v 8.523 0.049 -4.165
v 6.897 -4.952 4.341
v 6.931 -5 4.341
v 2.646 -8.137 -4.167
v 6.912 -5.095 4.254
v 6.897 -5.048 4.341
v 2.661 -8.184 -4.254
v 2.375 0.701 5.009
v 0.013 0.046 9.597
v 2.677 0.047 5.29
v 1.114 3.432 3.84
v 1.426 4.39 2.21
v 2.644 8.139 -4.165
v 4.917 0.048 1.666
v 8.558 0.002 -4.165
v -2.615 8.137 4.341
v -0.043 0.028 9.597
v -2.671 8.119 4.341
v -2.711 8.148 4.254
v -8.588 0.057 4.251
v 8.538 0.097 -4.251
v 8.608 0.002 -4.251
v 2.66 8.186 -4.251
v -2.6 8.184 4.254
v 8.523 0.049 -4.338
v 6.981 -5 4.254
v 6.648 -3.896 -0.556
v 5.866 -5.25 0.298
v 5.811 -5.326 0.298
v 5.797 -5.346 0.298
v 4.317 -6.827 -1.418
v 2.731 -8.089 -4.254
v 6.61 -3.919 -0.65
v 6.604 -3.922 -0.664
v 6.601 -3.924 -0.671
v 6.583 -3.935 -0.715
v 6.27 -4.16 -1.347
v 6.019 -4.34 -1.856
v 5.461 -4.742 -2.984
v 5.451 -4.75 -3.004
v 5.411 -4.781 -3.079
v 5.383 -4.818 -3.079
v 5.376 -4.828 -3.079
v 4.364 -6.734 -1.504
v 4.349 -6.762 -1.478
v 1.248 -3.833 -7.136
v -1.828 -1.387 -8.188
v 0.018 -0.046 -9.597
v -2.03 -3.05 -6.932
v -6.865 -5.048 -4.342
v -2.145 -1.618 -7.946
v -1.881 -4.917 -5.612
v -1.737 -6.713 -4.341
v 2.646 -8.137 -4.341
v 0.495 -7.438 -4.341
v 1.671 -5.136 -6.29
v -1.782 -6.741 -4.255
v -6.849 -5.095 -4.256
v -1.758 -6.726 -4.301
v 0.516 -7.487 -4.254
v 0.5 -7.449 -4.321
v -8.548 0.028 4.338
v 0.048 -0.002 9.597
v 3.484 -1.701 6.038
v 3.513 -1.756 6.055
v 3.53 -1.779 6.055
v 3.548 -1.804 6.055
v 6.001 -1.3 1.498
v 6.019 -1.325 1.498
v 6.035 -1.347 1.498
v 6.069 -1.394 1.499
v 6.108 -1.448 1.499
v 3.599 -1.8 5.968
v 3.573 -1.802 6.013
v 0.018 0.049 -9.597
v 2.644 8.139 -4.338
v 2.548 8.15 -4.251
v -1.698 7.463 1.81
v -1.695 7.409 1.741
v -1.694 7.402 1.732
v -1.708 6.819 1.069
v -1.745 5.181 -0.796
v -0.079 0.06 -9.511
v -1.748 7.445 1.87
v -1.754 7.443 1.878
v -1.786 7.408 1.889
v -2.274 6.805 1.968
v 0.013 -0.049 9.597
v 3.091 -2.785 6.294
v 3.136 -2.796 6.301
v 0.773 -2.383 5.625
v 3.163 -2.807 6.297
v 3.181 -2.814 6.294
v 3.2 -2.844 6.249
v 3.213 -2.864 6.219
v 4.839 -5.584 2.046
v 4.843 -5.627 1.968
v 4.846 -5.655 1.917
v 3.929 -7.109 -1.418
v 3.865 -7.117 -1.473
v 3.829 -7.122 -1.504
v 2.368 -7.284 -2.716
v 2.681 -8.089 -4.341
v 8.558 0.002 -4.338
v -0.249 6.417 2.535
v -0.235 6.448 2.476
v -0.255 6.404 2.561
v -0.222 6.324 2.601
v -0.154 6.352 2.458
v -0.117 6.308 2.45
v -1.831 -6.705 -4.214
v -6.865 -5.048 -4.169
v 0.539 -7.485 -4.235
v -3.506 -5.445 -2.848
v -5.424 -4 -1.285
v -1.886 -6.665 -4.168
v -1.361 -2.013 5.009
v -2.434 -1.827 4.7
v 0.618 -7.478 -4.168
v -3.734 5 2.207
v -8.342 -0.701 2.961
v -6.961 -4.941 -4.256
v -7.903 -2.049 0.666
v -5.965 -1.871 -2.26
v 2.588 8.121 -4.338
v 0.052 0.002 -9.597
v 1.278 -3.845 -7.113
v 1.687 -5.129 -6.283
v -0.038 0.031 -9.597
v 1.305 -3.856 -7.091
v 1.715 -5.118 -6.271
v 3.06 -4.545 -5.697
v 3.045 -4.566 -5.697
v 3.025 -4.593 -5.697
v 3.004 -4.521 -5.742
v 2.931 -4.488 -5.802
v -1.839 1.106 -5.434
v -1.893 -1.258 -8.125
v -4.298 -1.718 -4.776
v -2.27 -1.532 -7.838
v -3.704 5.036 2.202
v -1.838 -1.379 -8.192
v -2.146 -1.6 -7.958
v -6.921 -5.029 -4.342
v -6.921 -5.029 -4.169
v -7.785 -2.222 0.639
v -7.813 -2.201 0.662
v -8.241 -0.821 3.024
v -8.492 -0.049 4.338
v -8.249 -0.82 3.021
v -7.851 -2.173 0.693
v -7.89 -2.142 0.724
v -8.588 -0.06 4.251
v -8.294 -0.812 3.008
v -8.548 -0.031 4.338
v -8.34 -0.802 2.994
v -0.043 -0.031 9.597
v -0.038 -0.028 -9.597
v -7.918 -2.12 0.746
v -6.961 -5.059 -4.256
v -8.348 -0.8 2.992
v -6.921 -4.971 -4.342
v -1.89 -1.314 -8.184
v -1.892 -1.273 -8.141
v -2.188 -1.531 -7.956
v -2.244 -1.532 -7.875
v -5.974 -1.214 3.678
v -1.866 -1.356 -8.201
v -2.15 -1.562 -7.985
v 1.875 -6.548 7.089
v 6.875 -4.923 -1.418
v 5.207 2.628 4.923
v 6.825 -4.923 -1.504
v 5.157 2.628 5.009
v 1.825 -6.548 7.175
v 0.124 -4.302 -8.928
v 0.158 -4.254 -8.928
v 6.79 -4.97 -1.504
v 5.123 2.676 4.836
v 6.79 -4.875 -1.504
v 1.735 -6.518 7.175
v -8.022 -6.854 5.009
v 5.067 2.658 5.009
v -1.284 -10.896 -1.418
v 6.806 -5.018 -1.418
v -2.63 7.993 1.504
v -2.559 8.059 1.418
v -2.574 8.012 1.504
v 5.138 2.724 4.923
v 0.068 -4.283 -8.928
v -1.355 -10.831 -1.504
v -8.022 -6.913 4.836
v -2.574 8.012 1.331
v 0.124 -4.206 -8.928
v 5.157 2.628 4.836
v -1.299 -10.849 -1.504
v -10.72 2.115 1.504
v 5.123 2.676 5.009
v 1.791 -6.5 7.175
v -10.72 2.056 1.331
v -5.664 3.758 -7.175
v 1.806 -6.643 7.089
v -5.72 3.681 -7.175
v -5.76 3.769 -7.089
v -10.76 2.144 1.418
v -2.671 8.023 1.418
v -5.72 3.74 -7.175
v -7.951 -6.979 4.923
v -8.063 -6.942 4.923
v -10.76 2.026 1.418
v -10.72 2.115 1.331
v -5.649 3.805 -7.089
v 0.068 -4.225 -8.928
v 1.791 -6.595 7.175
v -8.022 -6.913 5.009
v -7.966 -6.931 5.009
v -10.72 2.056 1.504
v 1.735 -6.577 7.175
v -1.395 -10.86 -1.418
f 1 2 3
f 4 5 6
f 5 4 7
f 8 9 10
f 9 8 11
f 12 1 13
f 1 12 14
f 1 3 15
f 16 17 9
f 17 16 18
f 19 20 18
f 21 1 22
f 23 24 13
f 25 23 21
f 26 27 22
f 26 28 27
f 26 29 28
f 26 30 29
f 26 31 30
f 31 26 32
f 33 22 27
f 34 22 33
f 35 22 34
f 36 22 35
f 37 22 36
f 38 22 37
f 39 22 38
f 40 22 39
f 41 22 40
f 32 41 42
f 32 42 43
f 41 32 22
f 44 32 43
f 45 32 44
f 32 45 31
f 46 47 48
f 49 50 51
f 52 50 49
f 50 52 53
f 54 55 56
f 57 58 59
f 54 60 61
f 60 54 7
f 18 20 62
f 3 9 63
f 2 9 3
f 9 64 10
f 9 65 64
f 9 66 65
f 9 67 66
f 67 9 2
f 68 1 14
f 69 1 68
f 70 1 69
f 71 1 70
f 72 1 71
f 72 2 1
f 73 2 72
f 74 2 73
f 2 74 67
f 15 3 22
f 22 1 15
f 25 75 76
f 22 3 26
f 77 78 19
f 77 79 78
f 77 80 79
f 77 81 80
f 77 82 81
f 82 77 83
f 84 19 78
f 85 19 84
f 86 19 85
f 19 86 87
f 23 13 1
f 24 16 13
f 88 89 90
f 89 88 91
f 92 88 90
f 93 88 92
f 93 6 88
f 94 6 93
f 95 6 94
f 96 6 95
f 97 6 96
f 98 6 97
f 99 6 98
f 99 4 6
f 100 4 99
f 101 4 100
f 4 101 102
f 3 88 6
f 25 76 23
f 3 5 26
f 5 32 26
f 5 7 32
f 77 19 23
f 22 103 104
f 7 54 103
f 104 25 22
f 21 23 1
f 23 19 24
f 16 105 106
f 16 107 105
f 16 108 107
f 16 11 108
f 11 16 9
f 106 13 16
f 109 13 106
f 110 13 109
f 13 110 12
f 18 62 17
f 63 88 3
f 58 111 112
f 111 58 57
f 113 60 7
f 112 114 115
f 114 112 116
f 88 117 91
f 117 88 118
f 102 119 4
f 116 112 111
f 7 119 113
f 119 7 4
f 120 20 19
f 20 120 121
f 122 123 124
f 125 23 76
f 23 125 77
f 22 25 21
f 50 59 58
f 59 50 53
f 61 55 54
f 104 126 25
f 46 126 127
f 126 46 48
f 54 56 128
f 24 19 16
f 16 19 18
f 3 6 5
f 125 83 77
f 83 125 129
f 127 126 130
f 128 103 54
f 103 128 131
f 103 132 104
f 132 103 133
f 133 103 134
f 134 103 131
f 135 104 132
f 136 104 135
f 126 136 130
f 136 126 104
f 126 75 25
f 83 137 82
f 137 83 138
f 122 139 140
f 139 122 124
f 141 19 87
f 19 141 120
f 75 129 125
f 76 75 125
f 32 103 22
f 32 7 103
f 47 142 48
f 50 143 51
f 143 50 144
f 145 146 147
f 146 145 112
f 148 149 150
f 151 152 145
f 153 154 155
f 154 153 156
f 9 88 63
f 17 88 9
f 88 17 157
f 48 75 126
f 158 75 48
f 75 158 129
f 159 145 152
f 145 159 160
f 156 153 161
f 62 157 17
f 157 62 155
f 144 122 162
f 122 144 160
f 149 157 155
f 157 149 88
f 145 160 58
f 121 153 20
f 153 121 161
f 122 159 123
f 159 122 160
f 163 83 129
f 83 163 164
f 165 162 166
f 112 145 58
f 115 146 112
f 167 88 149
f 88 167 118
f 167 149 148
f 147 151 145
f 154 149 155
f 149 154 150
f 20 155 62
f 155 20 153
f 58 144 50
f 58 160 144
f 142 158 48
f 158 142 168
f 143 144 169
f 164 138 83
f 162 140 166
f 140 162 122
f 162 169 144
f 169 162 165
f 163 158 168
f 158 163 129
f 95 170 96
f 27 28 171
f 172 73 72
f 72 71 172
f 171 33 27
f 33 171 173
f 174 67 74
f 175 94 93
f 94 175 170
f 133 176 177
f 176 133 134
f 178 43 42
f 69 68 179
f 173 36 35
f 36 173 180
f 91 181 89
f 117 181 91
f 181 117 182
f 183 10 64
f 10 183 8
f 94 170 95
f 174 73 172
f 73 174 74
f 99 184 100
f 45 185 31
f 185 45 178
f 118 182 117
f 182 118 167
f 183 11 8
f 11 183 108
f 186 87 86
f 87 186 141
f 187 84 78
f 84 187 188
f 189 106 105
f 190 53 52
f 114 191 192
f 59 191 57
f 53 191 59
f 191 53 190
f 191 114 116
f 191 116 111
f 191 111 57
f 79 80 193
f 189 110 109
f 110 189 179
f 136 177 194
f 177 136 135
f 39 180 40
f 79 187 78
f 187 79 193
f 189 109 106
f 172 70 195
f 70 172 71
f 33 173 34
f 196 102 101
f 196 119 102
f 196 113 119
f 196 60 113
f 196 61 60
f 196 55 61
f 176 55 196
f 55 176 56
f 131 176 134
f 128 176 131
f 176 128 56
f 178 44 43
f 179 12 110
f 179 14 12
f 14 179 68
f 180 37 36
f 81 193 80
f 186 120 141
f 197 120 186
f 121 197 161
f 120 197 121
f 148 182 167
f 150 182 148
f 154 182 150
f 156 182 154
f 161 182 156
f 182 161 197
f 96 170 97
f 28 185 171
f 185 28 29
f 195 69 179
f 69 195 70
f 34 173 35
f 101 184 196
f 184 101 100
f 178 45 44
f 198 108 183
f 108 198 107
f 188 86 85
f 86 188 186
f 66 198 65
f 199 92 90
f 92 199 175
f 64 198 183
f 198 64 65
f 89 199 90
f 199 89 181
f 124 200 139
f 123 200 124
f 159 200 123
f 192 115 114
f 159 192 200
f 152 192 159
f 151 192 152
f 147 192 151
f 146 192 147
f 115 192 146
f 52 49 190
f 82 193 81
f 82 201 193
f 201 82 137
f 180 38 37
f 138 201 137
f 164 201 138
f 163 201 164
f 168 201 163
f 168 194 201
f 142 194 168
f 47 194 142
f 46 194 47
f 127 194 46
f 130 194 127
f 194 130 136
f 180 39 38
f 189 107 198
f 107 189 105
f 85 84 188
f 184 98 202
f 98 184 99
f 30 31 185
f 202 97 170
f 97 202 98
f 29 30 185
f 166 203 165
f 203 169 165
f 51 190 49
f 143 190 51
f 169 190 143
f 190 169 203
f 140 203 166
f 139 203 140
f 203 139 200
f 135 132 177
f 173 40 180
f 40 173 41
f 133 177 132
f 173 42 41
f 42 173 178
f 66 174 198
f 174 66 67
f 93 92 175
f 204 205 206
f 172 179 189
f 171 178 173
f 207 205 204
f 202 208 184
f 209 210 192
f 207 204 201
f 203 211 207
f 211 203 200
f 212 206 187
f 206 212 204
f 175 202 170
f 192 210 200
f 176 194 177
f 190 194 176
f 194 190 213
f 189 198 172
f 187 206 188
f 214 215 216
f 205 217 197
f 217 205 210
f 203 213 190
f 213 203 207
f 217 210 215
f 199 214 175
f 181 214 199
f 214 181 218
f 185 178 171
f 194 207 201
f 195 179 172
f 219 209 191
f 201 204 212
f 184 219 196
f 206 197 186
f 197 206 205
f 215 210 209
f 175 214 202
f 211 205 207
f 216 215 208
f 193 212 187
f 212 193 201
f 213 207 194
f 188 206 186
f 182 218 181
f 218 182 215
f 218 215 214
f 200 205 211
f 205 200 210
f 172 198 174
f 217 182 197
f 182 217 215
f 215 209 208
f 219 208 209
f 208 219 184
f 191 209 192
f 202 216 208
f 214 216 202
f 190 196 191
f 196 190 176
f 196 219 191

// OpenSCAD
// Auto-generated OpenSCAD file

    inner_points = 10*[[-0.5679521834680924, 0.3710392408495472, -0.708875678733561], [0.6774959295154908, -0.4922625333758151, -0.14177512924090818], [-1.0679348487285032, 0.2085260495957944, 0.14177512924090818], [0.17751326425508, -0.6547757246295679, 0.708875678733561], [0.010822126776322105, -0.4253965348253418, -0.8841193748434077], [-0.7981668194007837, -0.6883484018941259, 0.4922625450168436], [-0.2589805762752483, 0.796397621522542, 0.14177512737898157], [0.5107486887730253, 0.2628477825031803, 0.49226254200418296], [-0.13145834293776412, -1.0801341053025628, -0.14177512737898157]];

    outer_points = 10*[[-0.8507501659543638, -0.00016416400980563553, 0.42512659922224816], [0.0002222331138788114, 0.00016416400980563553, -0.9510564761622176], [-0.0002222331138788114, -0.00016416400980563553, 0.9510564761622176], [0.8507501659543638, 0.00016416400980563553, -0.42512659922224816], [-0.6880381915718803, -0.49999998970608384, -0.42557250195458624], [0.6881449121452123, -0.49999998970608384, 0.4253999146333339], [-0.26305127181358173, 0.8089155187812519, 0.4254035837408861], [0.2628785942986316, 0.8091184366568306, -0.4251243315890725], [0.26305127181358173, -0.8089155187812519, -0.4254035837408861]];

    // Convex hull for inner set (I)
    module inner_hull() {
        hull() {
            for (p = inner_points) {
                translate(p) sphere(r=0.1);
            }
        }
    }

    // Convex hull for outer set (O) minus inner hull (O \ I)
    module outer_minus_inner() {
        difference() {
            hull() {
                for (p = outer_points) {
                    translate(p) sphere(r=0.1);
                }
            }
            inner_hull(); // Subtract inner hull
        }
    }

    // Convex hull for outer set (O) minus all translated inner hulls
    module outer_minus_AllTranslationInner() {
        difference() {
            hull() {
                for (p = outer_points) {
                    translate(p) sphere(r=0.1);
                }
            }
            hull() {
                translate([0,0,50]) inner_hull();
                translate([0,0,-50]) inner_hull();
            }; // Subtract translated inner hulls
        }
    }

    // Difference between outer_minus_inner and outer_minus_AllTranslationInner
    module outer_minus_inner_diff() {
        difference() {
            // Outer minus inner
            difference() {
                hull() {
                    for (p = outer_points) {
                        translate(p) sphere(r=0.1);
                    }
                }
                inner_hull();
            }

            // Subtract Outer minus AllTranslationInner
            difference() {
                hull() {
                    for (p = outer_points) {
                        translate(p) sphere(r=0.1);
                    }
                }
                hull() {
                    translate([0,0,50]) inner_hull();
                    translate([0,0,-50]) inner_hull();
                };
            }
        }
    }

    // Rendering all with colors applied
    color([1, 0, 0, 0.5]) inner_hull(); // Transparent red
    color([0, 1, 0, 1]) outer_minus_AllTranslationInner(); // Opaque green
    color([1, 1, 0, 1]) outer_minus_inner_diff(); // Opaque yellow
    
